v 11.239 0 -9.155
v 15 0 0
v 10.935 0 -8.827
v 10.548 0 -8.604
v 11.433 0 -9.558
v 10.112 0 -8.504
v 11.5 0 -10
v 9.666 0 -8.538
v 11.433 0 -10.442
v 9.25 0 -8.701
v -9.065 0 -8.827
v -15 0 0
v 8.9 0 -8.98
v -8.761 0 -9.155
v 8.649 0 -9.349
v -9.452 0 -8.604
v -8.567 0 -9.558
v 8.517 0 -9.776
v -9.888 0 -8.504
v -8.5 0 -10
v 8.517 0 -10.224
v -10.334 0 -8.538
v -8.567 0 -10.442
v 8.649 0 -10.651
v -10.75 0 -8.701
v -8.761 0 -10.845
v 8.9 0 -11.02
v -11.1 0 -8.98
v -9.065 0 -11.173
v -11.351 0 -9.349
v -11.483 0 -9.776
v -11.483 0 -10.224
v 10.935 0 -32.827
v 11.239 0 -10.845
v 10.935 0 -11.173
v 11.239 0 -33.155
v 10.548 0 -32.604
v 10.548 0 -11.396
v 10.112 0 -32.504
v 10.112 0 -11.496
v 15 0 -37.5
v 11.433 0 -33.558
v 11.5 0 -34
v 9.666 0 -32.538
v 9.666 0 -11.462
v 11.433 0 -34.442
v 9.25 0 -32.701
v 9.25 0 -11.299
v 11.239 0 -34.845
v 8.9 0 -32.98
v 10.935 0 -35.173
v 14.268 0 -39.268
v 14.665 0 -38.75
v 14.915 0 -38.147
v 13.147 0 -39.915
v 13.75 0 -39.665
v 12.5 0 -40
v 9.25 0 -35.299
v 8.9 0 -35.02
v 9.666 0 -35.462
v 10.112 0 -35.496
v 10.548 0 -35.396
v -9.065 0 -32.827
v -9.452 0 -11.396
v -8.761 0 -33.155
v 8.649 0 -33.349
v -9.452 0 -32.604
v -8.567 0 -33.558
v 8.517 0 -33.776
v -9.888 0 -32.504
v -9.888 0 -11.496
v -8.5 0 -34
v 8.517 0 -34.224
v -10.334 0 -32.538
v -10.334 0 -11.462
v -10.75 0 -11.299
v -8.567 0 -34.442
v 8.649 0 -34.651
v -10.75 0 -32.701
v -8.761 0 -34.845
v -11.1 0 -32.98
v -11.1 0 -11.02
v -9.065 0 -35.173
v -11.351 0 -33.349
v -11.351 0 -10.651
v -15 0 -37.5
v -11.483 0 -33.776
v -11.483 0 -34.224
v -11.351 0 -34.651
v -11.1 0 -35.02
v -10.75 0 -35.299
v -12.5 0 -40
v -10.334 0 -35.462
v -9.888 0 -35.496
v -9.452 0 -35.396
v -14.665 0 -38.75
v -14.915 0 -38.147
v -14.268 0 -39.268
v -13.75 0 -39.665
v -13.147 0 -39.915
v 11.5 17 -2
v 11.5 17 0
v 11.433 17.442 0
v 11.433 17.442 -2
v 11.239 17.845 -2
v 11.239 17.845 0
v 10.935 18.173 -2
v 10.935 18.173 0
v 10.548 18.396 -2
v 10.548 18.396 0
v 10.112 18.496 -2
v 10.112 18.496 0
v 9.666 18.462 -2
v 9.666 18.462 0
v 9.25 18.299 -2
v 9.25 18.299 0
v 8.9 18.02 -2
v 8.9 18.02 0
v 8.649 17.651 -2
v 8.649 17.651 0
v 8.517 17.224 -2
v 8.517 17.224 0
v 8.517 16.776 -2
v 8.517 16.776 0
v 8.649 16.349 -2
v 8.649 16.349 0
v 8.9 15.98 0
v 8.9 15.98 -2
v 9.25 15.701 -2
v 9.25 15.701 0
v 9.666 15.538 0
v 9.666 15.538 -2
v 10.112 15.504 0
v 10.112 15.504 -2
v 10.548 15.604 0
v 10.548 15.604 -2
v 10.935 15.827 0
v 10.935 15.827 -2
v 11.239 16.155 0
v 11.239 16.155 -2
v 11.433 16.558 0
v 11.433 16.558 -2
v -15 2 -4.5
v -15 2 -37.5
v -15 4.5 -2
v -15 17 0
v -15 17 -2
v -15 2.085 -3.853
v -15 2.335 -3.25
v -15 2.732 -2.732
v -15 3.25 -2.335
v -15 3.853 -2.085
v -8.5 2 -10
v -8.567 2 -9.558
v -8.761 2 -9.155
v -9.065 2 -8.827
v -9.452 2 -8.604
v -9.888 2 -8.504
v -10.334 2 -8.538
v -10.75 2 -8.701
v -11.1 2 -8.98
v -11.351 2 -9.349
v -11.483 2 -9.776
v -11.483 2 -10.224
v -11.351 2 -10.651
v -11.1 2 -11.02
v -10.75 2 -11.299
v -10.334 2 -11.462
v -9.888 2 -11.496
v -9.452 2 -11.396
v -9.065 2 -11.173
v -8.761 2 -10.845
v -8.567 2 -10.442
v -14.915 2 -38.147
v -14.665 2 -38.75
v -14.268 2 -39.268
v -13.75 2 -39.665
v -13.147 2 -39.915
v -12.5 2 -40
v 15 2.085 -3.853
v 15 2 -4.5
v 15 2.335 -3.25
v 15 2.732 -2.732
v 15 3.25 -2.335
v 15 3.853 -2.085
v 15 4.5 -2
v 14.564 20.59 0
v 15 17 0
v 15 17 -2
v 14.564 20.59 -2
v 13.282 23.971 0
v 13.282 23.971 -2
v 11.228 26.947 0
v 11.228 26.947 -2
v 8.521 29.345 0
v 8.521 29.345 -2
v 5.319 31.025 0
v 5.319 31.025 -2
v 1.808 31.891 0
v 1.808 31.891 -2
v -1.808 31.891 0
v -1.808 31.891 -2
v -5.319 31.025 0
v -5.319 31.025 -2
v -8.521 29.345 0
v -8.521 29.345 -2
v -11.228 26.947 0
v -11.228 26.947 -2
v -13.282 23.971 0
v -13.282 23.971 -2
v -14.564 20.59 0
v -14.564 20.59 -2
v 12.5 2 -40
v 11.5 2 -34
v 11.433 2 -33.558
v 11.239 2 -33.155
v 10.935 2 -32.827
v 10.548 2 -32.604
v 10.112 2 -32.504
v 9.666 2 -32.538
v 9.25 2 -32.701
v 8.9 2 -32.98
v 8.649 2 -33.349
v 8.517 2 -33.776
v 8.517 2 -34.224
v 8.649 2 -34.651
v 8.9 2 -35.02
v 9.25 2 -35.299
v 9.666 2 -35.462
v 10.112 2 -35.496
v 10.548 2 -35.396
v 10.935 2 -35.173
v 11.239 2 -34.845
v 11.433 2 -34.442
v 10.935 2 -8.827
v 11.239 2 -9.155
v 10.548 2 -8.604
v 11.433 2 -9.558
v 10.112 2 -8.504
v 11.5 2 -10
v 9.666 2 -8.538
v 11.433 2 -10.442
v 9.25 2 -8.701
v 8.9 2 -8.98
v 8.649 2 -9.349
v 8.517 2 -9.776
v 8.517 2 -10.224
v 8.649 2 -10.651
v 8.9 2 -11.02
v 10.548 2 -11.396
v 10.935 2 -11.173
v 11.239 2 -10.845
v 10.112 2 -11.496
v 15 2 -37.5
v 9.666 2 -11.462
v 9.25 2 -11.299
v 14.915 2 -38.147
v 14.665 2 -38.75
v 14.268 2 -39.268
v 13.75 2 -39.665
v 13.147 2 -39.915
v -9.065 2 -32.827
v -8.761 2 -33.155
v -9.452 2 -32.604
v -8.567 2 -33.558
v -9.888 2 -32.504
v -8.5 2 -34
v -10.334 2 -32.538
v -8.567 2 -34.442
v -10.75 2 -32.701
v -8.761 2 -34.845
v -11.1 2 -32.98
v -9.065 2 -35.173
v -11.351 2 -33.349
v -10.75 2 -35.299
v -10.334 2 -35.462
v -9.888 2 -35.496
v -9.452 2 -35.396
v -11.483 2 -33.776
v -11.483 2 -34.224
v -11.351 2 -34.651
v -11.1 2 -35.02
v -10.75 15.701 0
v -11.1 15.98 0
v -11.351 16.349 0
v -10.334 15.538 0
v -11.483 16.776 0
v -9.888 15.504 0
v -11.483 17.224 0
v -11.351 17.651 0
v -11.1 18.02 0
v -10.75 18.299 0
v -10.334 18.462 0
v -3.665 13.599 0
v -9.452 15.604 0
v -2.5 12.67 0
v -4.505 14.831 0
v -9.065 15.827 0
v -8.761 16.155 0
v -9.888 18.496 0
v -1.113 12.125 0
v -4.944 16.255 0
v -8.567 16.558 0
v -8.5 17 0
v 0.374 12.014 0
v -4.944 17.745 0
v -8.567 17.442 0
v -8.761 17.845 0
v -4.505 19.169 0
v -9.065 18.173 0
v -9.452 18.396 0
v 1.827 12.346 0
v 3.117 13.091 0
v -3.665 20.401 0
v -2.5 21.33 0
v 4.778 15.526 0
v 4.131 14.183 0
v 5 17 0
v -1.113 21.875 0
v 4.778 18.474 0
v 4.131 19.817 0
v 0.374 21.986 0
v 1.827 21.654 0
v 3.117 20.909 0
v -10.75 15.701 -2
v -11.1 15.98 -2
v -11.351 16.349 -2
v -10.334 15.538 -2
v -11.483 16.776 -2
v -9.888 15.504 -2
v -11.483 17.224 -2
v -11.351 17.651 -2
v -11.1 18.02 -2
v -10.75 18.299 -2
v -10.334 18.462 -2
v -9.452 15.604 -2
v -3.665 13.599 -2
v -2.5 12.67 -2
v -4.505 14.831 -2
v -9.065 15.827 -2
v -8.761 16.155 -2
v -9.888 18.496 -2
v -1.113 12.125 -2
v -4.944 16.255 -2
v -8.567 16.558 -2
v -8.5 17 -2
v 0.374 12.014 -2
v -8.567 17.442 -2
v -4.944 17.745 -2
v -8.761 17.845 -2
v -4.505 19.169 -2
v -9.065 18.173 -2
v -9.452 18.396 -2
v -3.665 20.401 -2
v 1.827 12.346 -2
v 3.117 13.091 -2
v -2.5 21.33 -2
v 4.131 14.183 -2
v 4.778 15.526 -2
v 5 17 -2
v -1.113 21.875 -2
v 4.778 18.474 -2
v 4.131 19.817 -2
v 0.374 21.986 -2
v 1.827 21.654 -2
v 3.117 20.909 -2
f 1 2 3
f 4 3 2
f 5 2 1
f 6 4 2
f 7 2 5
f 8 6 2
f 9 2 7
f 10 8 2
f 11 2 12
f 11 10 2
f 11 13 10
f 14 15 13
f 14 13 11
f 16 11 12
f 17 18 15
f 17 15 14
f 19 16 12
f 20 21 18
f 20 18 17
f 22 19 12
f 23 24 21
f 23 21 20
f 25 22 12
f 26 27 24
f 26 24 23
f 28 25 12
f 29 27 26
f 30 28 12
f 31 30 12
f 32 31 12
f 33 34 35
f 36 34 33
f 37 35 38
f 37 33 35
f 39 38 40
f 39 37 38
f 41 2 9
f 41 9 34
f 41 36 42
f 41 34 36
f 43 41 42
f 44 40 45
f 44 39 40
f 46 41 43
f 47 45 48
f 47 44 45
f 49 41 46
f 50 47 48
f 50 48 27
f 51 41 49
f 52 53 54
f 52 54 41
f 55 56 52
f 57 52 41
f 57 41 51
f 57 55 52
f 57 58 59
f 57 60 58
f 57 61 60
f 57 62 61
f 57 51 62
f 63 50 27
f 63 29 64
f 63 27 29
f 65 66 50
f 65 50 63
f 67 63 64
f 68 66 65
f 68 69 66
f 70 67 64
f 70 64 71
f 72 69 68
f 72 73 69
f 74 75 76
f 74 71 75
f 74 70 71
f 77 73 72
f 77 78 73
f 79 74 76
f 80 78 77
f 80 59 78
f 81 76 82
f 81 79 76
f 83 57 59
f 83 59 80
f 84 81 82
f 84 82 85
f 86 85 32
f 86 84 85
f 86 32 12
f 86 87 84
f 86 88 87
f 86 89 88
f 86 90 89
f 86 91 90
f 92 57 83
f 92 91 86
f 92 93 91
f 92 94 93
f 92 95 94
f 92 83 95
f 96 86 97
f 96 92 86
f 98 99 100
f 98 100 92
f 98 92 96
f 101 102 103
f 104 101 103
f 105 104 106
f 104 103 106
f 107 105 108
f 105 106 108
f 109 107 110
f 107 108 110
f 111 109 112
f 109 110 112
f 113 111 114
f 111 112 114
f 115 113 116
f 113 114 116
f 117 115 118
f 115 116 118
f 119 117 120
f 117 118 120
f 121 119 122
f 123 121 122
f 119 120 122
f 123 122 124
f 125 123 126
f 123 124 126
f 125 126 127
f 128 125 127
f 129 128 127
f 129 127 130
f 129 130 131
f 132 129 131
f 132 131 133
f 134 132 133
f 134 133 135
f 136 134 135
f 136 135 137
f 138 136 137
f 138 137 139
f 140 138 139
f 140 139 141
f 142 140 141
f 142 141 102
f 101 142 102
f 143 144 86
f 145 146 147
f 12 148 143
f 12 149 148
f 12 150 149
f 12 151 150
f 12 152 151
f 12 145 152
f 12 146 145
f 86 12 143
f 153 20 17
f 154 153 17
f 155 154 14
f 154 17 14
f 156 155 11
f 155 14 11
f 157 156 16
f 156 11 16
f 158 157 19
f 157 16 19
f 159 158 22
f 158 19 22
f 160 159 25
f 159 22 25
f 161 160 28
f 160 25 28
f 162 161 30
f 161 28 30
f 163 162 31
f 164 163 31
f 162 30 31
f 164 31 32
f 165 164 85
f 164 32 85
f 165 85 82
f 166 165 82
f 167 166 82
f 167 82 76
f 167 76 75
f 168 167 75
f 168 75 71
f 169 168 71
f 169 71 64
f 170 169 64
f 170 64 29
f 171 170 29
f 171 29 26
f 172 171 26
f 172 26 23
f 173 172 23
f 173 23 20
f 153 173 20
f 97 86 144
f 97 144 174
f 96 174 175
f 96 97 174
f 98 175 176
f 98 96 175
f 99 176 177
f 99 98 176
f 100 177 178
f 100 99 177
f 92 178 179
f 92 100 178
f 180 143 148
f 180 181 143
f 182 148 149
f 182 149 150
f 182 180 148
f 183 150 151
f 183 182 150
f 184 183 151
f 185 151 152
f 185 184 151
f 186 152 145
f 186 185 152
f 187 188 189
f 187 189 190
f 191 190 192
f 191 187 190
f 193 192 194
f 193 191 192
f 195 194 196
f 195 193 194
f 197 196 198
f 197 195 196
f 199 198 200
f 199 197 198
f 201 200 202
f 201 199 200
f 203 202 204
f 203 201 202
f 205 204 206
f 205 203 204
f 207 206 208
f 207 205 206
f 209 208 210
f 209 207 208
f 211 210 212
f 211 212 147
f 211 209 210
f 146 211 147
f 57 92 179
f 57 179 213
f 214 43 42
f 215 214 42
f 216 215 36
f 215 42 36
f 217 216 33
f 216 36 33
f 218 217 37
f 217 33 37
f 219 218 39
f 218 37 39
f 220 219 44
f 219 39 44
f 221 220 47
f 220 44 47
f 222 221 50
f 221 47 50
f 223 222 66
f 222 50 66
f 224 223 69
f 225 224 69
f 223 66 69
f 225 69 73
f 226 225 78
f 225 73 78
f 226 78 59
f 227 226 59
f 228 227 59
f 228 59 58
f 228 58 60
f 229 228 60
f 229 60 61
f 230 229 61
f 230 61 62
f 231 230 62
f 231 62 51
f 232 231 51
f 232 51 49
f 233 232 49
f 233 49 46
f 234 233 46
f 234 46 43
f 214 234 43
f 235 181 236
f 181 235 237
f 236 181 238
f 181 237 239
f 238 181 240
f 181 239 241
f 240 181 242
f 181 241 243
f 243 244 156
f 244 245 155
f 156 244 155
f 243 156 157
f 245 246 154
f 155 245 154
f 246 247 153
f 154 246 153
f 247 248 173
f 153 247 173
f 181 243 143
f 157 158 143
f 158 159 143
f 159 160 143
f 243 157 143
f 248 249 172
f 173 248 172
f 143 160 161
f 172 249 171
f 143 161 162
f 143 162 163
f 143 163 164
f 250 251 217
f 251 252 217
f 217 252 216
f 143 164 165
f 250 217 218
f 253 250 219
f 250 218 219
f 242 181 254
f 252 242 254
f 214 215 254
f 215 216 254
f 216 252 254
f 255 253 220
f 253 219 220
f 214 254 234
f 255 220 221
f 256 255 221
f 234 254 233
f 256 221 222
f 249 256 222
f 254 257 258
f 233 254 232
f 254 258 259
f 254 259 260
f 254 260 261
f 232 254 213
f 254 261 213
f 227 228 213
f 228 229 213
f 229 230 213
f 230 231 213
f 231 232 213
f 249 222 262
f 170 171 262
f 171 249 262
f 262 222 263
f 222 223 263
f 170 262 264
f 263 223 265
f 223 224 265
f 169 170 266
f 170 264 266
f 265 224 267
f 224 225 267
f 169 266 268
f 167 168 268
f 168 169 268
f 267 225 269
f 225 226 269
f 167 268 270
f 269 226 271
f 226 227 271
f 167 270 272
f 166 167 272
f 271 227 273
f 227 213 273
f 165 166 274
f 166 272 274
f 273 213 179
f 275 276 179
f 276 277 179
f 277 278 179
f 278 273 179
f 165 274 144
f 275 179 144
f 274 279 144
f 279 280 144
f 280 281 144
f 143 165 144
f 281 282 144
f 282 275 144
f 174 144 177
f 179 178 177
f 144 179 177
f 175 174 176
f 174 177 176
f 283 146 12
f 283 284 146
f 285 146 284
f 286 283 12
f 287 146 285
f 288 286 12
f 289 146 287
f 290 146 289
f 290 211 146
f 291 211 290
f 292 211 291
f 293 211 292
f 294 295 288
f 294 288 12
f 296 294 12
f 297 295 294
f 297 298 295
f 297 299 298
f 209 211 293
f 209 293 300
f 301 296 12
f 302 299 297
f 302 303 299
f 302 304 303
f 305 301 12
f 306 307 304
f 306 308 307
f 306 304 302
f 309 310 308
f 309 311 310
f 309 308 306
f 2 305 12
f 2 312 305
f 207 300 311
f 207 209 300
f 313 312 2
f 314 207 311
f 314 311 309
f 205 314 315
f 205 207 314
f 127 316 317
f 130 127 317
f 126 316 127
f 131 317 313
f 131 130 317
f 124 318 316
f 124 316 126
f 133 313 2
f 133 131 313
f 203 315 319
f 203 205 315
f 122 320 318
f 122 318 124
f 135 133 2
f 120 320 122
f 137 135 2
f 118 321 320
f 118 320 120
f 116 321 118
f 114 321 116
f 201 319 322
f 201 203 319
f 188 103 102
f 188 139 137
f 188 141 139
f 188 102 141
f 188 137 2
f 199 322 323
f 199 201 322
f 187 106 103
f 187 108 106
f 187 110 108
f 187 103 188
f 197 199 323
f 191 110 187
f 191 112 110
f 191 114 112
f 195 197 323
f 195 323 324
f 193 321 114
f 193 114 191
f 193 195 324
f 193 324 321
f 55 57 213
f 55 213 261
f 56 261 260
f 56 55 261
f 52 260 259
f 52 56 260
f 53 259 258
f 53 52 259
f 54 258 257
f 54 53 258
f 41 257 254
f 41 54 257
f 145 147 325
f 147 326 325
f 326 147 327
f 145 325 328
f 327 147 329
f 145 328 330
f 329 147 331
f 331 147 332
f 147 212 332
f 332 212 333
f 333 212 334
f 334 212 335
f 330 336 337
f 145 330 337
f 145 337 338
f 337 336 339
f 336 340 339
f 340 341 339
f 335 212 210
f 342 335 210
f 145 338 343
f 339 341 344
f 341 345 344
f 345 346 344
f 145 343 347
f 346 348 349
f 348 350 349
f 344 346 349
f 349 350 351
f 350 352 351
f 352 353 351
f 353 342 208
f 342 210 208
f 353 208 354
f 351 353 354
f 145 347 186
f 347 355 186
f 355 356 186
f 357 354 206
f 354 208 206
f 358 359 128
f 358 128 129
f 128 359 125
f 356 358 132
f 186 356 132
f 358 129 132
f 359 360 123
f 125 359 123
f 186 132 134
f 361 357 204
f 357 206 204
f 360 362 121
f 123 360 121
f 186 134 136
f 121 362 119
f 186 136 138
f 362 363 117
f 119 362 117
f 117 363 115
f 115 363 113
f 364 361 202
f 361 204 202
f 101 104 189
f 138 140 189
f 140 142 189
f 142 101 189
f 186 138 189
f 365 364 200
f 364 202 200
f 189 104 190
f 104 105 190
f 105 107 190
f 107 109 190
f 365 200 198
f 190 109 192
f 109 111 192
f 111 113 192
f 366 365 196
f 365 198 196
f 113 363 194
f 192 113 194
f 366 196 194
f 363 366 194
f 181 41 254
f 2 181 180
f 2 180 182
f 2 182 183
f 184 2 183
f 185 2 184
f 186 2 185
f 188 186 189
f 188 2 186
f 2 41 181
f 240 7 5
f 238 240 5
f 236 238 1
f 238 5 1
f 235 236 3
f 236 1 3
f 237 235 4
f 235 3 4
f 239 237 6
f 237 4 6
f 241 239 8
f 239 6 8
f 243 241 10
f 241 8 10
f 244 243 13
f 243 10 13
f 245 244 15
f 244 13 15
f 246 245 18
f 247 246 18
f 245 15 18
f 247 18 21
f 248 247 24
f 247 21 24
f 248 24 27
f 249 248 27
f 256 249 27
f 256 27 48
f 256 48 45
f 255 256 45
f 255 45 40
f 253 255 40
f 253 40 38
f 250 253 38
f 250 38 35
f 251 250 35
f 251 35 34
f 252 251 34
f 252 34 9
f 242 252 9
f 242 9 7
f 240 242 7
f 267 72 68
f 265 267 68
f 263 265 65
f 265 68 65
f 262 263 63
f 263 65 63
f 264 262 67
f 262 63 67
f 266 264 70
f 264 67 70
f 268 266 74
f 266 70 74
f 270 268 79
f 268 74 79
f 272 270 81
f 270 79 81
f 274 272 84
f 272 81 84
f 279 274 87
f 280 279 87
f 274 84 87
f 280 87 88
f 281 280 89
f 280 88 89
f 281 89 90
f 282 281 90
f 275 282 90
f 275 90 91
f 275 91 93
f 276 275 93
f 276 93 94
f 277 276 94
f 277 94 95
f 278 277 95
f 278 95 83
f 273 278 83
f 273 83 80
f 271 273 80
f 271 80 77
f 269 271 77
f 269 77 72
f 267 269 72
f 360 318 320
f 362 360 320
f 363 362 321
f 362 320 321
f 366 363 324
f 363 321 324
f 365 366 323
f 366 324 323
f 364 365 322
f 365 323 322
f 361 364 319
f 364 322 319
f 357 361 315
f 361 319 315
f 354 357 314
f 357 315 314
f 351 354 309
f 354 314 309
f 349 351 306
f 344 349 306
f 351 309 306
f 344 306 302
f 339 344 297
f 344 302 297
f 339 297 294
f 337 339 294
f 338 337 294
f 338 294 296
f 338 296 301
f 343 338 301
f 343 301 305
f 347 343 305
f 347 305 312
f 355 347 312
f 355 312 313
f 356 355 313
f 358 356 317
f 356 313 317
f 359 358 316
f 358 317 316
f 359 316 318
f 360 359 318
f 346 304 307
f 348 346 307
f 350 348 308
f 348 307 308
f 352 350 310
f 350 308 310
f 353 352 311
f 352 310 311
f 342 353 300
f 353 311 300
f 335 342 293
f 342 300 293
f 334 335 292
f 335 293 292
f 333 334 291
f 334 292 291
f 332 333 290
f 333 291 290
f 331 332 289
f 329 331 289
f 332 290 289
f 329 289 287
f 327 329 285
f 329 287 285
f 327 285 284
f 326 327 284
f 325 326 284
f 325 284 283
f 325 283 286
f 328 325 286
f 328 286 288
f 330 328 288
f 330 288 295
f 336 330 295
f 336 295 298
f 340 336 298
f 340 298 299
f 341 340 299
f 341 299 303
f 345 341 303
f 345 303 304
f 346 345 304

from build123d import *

# Parameters (mm, degrees)
EXTRUDE_1_DEPTH     = 2
SKETCH_2_R          = 5
EXTRUDE_2_DEPTH     = 2
FILLET_1_R          = 2.5
SKETCH_3_R          = 1.5
CUT_EXTRUDE_1_DEPTH = 12
SKETCH_4_R          = 1.5
CUT_EXTRUDE_2_DEPTH = 10


with BuildPart() as part:
    # 草图1 → 凸台-拉伸1 (new body)
    with BuildSketch(Plane(origin=(0, 0, 0), x_dir=(1, 0, 0), z_dir=(0, 1, 0))):
        with BuildLine():
            Line((-12.5, 40), (12.5, 40))
            ThreePointArc((12.5, 40), (14.267766953, 39.267766953), (15, 37.5))
            Line((15, 37.5), (15, 0))
            Line((15, 0), (-15, 0))
            Line((-15, 0), (-15, 37.5))
            ThreePointArc((-15, 37.5), (-14.267766953, 39.267766953), (-12.5, 40))
        make_face()
    extrude(amount=EXTRUDE_1_DEPTH)

    # 草图2 → 凸台-拉伸2 (add)
    with BuildSketch(Plane.XY):
        with BuildLine():
            Line((-15, 17), (-15, 2))
            Line((-15, 2), (15, 2))
            Line((15, 2), (15, 17))
            ThreePointArc((15, 17), (0, 32), (-15, 17))
        make_face()
        with Locations((0, 17)):
            Circle(SKETCH_2_R, mode=Mode.SUBTRACT)
    extrude(amount=-EXTRUDE_2_DEPTH)

    # 圆角1
    fillet_1_edges = [part.edges().sort_by_distance(p)[0] for p in [
        (0, 2, -2),
    ]]
    fillet(fillet_1_edges, radius=FILLET_1_R)

    # 草图3 → 切除-拉伸1 (cut)
    with BuildSketch(Plane.XZ):
        with Locations((10, -10)):
            Circle(SKETCH_3_R)
        with Locations((-10, -10)):
            Circle(SKETCH_3_R)
        with Locations((-10, -34)):
            Circle(SKETCH_3_R)
        with Locations((10, -34)):
            Circle(SKETCH_3_R)
    extrude(amount=-CUT_EXTRUDE_1_DEPTH, mode=Mode.SUBTRACT)

    # 草图4 → 切除-拉伸2 (cut)
    with BuildSketch(Plane.XY):
        with Locations((10, 17)):
            Circle(SKETCH_4_R)
        with Locations((-10, 17)):
            Circle(SKETCH_4_R)
    extrude(amount=-CUT_EXTRUDE_2_DEPTH, mode=Mode.SUBTRACT)


solid = part.part
